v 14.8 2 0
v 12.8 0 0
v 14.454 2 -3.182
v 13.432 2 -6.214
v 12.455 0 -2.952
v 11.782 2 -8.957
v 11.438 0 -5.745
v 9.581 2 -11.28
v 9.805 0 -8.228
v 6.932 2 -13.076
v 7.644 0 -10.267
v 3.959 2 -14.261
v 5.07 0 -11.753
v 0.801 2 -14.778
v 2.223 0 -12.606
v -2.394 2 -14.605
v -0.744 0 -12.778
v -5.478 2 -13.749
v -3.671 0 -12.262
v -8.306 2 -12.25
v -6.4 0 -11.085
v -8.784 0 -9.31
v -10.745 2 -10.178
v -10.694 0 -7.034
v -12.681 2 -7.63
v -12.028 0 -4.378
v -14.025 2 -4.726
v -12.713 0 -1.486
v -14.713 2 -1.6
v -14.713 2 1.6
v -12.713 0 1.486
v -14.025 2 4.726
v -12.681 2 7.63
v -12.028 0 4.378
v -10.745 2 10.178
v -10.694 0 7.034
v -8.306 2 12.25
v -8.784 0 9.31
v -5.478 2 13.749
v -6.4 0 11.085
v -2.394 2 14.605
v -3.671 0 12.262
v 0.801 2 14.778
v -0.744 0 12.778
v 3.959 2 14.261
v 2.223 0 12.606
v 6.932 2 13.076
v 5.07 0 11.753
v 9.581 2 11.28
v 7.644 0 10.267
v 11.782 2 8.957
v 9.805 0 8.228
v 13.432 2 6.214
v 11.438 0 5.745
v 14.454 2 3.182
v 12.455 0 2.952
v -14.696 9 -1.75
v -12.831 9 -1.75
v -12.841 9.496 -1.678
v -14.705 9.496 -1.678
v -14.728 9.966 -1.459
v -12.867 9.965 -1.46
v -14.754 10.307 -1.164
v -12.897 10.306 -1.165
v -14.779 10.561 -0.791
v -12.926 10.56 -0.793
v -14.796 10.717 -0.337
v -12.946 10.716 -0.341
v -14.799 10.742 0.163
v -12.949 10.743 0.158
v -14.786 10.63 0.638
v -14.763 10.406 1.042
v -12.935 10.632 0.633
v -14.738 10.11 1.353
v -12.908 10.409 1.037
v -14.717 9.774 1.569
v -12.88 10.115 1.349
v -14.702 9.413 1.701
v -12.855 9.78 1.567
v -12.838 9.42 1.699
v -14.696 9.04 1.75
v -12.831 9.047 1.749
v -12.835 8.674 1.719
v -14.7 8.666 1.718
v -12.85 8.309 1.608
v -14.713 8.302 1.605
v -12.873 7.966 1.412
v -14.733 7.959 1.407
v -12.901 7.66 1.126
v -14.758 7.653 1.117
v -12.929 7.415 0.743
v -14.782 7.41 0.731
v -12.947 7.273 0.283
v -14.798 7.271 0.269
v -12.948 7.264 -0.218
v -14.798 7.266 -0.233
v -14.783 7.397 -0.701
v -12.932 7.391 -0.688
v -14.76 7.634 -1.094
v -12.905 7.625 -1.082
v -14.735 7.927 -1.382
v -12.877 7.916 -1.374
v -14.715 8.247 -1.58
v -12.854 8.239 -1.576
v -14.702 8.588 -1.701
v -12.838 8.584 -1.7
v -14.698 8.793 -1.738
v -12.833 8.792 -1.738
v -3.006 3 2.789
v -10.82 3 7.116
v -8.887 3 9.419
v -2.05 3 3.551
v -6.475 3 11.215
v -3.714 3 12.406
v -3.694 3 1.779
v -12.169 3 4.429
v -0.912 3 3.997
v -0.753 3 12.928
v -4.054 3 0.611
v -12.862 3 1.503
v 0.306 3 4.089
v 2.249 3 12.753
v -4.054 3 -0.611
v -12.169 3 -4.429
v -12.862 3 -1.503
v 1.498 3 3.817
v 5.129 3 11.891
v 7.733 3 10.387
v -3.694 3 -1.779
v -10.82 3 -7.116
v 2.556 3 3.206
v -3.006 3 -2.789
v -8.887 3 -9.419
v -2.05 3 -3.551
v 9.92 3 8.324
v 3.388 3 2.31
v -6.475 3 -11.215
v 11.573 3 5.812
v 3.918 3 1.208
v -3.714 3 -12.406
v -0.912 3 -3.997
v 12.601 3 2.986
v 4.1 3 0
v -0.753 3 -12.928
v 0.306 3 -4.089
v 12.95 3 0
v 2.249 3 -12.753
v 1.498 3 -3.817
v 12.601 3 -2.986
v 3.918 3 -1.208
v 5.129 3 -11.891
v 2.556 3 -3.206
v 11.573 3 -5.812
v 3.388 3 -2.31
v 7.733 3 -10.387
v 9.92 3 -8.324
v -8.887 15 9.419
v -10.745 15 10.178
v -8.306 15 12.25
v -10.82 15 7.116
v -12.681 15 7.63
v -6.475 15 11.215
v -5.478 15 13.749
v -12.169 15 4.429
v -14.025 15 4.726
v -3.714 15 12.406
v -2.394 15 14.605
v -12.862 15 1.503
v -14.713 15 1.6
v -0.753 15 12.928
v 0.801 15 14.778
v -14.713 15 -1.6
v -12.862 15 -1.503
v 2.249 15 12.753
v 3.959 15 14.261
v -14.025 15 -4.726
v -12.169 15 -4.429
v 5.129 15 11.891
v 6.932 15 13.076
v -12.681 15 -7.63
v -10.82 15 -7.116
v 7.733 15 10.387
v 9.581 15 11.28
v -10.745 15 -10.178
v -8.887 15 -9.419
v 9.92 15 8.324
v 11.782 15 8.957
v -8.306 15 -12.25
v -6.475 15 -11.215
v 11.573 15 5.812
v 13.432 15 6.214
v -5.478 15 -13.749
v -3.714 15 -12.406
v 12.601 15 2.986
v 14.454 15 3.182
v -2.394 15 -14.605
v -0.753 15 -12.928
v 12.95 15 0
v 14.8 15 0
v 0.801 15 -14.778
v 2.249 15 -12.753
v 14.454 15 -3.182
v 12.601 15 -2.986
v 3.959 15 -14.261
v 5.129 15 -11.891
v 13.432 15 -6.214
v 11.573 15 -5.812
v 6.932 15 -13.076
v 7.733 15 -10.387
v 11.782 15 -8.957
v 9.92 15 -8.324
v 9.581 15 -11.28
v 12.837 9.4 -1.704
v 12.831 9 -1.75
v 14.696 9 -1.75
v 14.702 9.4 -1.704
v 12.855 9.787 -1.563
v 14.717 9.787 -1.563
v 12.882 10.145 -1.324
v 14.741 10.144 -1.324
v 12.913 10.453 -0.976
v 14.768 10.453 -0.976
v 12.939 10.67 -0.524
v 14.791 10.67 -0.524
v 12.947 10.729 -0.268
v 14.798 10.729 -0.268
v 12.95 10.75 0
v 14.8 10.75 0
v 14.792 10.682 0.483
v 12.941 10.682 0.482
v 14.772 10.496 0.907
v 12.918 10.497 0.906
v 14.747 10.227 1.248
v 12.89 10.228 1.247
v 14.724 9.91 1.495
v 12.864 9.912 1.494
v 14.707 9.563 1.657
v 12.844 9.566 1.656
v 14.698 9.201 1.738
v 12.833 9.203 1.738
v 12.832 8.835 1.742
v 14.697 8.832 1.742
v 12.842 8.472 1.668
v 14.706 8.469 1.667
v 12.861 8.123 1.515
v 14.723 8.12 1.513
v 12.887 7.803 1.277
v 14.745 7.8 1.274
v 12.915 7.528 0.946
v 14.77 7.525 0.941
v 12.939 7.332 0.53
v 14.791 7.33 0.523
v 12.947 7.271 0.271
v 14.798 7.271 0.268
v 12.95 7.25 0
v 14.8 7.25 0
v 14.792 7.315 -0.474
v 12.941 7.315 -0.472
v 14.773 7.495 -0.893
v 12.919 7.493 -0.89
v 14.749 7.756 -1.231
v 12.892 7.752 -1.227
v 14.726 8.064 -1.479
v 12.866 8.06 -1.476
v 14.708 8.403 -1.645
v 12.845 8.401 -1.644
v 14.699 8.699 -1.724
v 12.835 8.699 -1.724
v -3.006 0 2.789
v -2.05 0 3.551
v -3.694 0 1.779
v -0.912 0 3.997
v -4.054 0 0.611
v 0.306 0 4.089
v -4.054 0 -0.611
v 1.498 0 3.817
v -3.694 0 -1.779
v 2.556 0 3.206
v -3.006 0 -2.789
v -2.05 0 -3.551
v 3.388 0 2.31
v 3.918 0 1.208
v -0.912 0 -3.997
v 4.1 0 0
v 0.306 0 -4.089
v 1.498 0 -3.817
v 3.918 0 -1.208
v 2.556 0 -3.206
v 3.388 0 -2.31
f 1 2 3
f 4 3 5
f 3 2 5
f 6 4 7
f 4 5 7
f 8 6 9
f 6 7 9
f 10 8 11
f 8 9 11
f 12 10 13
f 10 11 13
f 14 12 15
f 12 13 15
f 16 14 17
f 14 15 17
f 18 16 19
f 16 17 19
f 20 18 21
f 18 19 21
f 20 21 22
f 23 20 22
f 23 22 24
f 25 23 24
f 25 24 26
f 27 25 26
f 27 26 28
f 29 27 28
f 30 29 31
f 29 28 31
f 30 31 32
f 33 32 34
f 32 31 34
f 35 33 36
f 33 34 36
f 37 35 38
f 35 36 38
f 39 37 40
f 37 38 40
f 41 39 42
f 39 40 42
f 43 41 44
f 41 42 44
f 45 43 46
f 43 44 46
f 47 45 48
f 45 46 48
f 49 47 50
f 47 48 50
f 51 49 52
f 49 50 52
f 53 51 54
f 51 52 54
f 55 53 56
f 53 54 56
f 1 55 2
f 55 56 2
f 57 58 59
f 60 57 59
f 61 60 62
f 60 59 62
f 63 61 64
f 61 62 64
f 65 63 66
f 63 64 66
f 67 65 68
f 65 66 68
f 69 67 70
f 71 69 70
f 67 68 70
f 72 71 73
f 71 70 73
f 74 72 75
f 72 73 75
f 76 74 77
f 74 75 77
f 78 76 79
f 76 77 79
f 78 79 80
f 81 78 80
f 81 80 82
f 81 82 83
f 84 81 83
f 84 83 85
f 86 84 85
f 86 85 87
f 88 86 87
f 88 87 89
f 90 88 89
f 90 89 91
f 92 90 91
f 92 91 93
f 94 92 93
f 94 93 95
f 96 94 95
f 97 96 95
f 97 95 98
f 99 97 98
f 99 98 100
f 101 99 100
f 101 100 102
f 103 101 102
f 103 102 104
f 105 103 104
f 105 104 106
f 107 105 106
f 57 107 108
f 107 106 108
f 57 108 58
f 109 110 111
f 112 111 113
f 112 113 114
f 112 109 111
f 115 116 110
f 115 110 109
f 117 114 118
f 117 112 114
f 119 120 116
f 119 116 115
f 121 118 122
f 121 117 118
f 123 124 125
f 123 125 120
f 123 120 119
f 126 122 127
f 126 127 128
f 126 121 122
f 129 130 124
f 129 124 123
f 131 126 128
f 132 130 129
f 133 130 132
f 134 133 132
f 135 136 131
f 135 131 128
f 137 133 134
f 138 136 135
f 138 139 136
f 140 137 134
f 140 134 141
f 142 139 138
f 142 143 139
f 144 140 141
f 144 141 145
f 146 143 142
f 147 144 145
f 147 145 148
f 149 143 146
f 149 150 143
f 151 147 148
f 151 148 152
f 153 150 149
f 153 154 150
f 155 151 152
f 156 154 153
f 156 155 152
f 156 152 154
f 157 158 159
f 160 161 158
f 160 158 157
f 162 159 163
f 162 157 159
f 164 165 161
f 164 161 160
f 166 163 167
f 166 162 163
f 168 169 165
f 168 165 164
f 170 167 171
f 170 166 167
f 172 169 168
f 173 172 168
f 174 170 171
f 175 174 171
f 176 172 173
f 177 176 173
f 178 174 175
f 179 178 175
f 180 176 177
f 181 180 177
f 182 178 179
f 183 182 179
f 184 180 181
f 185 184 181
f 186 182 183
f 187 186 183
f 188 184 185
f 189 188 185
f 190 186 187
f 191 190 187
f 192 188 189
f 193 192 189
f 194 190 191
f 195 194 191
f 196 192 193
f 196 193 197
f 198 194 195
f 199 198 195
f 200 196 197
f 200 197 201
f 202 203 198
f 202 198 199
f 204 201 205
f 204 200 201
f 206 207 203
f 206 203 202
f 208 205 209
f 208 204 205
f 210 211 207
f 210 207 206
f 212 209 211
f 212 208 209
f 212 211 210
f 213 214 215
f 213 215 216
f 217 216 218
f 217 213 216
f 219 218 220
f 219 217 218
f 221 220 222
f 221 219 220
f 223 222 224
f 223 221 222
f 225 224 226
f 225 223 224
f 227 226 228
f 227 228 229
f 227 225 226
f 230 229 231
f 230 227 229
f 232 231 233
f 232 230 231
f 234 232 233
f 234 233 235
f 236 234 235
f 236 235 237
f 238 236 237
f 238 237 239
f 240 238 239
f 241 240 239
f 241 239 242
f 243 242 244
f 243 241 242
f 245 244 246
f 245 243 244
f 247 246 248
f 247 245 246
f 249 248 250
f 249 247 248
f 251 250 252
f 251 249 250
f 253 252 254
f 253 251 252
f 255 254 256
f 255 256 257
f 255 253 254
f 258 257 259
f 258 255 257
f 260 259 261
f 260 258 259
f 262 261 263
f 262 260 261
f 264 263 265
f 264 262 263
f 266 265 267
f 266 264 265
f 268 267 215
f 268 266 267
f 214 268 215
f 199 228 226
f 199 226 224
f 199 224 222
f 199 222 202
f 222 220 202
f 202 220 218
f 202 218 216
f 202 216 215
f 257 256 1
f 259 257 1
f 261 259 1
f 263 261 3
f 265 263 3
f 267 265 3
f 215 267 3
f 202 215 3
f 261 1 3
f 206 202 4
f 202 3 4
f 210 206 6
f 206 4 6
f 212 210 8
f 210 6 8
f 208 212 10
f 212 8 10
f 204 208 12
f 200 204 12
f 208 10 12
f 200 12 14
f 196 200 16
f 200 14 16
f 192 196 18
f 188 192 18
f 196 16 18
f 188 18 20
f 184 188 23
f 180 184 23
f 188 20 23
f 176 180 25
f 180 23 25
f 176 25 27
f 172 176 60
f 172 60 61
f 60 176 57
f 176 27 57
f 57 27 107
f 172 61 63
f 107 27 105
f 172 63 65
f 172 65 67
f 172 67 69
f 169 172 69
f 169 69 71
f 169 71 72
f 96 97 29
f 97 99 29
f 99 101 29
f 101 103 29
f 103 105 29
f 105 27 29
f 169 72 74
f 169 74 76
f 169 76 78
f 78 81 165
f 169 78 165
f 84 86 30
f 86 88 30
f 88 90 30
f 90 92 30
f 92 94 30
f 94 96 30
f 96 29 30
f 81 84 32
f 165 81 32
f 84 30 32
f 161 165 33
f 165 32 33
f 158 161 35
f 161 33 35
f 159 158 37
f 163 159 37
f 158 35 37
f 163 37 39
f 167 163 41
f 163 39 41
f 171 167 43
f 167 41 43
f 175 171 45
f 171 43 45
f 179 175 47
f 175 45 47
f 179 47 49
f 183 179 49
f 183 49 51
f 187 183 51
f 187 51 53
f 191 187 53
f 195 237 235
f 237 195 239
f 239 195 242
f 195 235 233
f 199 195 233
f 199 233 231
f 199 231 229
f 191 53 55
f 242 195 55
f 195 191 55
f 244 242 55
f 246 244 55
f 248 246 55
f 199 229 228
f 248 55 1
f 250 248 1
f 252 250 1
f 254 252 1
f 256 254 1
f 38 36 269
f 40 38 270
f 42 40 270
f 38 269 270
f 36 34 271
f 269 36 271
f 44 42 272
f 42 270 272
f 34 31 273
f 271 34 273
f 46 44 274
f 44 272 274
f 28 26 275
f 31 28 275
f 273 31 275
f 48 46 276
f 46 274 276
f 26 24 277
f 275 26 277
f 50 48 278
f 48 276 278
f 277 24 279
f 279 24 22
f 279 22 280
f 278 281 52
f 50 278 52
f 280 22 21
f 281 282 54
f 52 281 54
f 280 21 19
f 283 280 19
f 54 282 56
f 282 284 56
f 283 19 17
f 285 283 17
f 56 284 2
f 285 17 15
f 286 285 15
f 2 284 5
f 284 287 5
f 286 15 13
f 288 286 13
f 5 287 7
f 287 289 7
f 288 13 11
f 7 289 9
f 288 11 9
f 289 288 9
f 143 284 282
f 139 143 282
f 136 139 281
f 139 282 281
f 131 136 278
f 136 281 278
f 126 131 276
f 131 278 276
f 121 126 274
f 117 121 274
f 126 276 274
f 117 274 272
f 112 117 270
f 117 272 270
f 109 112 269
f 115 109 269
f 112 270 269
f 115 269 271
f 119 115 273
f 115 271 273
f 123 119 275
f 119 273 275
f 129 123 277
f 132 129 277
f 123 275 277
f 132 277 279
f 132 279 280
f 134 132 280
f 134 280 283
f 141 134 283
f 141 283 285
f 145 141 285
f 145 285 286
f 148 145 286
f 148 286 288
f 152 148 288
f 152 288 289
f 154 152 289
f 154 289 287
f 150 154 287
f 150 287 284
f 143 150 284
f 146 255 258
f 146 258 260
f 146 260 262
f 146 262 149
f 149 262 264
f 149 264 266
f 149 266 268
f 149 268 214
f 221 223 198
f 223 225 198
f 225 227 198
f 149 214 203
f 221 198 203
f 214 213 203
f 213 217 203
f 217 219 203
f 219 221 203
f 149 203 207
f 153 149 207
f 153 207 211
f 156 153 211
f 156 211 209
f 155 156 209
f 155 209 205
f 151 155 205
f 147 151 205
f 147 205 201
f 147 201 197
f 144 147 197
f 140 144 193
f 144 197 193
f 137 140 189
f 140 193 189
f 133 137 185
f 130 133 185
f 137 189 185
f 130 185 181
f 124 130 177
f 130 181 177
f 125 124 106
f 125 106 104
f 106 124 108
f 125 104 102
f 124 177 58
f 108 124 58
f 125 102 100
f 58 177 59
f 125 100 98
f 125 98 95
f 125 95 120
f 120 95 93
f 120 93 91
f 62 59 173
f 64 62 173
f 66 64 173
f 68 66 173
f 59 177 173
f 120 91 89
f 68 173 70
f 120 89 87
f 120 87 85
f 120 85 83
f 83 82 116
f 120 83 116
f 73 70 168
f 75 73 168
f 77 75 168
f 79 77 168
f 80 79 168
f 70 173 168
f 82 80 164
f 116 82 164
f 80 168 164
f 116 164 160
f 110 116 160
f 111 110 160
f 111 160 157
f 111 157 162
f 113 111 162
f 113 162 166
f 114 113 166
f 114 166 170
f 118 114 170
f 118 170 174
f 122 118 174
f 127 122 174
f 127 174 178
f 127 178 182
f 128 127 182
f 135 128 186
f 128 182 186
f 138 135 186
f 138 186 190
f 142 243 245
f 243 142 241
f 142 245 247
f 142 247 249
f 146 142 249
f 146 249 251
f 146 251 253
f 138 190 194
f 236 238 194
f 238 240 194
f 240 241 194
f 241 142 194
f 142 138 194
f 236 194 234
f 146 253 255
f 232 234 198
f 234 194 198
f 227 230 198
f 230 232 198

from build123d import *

# Parameters (mm, degrees)
SKETCH1_R               = 14.8
BOSS_EXTRUDE1_DEPTH     = 15
SKETCH2_R               = 12.95
CUT_EXTRUDE1_DEPTH      = 12
SKETCH3_R               = 1.75
CUT_EXTRUDE2_DEPTH      = 15.8
CUT_EXTRUDE2_DEPTH_BACK = 15.8
SKETCH4_R               = 4.1
CUT_EXTRUDE3_DEPTH      = 16.0000001
CHAMFER1_SIZE           = 2


with BuildPart() as part:
    # Sketch1 → Boss-Extrude1 (new body)
    with BuildSketch(Plane(origin=(0, 0, 0), x_dir=(1, 0, 0), z_dir=(0, 1, 0))):
        Circle(SKETCH1_R)
    extrude(amount=BOSS_EXTRUDE1_DEPTH)

    # Sketch2 → Cut-Extrude1 (cut)
    with BuildSketch(Plane(origin=(0, 15, 0), x_dir=(1, 0, 0), z_dir=(0, 1, 0))):
        Circle(SKETCH2_R)
    extrude(amount=-CUT_EXTRUDE1_DEPTH, mode=Mode.SUBTRACT)

    # Sketch3 → Cut-Extrude2 (cut, two sides)
    with BuildSketch(Plane(origin=(0, 0, 0), x_dir=(0, 0, -1), z_dir=(1, 0, 0))) as cut_extrude2_sk:
        with Locations((0, 9)):
            Circle(SKETCH3_R)
    extrude(amount=CUT_EXTRUDE2_DEPTH, mode=Mode.SUBTRACT)
    extrude(cut_extrude2_sk.sketch, amount=-CUT_EXTRUDE2_DEPTH_BACK, mode=Mode.SUBTRACT)

    # Sketch4 → Cut-Extrude3 (cut, through all)
    with BuildSketch(Plane.XZ):
        Circle(SKETCH4_R)
    extrude(amount=-CUT_EXTRUDE3_DEPTH, mode=Mode.SUBTRACT)

    # Chamfer1
    chamfer1_edges = [part.edges().sort_by_distance(p)[0] for p in [
        (-14.8, 0, 0),
    ]]
    chamfer(chamfer1_edges, length=CHAMFER1_SIZE)


solid = part.part
